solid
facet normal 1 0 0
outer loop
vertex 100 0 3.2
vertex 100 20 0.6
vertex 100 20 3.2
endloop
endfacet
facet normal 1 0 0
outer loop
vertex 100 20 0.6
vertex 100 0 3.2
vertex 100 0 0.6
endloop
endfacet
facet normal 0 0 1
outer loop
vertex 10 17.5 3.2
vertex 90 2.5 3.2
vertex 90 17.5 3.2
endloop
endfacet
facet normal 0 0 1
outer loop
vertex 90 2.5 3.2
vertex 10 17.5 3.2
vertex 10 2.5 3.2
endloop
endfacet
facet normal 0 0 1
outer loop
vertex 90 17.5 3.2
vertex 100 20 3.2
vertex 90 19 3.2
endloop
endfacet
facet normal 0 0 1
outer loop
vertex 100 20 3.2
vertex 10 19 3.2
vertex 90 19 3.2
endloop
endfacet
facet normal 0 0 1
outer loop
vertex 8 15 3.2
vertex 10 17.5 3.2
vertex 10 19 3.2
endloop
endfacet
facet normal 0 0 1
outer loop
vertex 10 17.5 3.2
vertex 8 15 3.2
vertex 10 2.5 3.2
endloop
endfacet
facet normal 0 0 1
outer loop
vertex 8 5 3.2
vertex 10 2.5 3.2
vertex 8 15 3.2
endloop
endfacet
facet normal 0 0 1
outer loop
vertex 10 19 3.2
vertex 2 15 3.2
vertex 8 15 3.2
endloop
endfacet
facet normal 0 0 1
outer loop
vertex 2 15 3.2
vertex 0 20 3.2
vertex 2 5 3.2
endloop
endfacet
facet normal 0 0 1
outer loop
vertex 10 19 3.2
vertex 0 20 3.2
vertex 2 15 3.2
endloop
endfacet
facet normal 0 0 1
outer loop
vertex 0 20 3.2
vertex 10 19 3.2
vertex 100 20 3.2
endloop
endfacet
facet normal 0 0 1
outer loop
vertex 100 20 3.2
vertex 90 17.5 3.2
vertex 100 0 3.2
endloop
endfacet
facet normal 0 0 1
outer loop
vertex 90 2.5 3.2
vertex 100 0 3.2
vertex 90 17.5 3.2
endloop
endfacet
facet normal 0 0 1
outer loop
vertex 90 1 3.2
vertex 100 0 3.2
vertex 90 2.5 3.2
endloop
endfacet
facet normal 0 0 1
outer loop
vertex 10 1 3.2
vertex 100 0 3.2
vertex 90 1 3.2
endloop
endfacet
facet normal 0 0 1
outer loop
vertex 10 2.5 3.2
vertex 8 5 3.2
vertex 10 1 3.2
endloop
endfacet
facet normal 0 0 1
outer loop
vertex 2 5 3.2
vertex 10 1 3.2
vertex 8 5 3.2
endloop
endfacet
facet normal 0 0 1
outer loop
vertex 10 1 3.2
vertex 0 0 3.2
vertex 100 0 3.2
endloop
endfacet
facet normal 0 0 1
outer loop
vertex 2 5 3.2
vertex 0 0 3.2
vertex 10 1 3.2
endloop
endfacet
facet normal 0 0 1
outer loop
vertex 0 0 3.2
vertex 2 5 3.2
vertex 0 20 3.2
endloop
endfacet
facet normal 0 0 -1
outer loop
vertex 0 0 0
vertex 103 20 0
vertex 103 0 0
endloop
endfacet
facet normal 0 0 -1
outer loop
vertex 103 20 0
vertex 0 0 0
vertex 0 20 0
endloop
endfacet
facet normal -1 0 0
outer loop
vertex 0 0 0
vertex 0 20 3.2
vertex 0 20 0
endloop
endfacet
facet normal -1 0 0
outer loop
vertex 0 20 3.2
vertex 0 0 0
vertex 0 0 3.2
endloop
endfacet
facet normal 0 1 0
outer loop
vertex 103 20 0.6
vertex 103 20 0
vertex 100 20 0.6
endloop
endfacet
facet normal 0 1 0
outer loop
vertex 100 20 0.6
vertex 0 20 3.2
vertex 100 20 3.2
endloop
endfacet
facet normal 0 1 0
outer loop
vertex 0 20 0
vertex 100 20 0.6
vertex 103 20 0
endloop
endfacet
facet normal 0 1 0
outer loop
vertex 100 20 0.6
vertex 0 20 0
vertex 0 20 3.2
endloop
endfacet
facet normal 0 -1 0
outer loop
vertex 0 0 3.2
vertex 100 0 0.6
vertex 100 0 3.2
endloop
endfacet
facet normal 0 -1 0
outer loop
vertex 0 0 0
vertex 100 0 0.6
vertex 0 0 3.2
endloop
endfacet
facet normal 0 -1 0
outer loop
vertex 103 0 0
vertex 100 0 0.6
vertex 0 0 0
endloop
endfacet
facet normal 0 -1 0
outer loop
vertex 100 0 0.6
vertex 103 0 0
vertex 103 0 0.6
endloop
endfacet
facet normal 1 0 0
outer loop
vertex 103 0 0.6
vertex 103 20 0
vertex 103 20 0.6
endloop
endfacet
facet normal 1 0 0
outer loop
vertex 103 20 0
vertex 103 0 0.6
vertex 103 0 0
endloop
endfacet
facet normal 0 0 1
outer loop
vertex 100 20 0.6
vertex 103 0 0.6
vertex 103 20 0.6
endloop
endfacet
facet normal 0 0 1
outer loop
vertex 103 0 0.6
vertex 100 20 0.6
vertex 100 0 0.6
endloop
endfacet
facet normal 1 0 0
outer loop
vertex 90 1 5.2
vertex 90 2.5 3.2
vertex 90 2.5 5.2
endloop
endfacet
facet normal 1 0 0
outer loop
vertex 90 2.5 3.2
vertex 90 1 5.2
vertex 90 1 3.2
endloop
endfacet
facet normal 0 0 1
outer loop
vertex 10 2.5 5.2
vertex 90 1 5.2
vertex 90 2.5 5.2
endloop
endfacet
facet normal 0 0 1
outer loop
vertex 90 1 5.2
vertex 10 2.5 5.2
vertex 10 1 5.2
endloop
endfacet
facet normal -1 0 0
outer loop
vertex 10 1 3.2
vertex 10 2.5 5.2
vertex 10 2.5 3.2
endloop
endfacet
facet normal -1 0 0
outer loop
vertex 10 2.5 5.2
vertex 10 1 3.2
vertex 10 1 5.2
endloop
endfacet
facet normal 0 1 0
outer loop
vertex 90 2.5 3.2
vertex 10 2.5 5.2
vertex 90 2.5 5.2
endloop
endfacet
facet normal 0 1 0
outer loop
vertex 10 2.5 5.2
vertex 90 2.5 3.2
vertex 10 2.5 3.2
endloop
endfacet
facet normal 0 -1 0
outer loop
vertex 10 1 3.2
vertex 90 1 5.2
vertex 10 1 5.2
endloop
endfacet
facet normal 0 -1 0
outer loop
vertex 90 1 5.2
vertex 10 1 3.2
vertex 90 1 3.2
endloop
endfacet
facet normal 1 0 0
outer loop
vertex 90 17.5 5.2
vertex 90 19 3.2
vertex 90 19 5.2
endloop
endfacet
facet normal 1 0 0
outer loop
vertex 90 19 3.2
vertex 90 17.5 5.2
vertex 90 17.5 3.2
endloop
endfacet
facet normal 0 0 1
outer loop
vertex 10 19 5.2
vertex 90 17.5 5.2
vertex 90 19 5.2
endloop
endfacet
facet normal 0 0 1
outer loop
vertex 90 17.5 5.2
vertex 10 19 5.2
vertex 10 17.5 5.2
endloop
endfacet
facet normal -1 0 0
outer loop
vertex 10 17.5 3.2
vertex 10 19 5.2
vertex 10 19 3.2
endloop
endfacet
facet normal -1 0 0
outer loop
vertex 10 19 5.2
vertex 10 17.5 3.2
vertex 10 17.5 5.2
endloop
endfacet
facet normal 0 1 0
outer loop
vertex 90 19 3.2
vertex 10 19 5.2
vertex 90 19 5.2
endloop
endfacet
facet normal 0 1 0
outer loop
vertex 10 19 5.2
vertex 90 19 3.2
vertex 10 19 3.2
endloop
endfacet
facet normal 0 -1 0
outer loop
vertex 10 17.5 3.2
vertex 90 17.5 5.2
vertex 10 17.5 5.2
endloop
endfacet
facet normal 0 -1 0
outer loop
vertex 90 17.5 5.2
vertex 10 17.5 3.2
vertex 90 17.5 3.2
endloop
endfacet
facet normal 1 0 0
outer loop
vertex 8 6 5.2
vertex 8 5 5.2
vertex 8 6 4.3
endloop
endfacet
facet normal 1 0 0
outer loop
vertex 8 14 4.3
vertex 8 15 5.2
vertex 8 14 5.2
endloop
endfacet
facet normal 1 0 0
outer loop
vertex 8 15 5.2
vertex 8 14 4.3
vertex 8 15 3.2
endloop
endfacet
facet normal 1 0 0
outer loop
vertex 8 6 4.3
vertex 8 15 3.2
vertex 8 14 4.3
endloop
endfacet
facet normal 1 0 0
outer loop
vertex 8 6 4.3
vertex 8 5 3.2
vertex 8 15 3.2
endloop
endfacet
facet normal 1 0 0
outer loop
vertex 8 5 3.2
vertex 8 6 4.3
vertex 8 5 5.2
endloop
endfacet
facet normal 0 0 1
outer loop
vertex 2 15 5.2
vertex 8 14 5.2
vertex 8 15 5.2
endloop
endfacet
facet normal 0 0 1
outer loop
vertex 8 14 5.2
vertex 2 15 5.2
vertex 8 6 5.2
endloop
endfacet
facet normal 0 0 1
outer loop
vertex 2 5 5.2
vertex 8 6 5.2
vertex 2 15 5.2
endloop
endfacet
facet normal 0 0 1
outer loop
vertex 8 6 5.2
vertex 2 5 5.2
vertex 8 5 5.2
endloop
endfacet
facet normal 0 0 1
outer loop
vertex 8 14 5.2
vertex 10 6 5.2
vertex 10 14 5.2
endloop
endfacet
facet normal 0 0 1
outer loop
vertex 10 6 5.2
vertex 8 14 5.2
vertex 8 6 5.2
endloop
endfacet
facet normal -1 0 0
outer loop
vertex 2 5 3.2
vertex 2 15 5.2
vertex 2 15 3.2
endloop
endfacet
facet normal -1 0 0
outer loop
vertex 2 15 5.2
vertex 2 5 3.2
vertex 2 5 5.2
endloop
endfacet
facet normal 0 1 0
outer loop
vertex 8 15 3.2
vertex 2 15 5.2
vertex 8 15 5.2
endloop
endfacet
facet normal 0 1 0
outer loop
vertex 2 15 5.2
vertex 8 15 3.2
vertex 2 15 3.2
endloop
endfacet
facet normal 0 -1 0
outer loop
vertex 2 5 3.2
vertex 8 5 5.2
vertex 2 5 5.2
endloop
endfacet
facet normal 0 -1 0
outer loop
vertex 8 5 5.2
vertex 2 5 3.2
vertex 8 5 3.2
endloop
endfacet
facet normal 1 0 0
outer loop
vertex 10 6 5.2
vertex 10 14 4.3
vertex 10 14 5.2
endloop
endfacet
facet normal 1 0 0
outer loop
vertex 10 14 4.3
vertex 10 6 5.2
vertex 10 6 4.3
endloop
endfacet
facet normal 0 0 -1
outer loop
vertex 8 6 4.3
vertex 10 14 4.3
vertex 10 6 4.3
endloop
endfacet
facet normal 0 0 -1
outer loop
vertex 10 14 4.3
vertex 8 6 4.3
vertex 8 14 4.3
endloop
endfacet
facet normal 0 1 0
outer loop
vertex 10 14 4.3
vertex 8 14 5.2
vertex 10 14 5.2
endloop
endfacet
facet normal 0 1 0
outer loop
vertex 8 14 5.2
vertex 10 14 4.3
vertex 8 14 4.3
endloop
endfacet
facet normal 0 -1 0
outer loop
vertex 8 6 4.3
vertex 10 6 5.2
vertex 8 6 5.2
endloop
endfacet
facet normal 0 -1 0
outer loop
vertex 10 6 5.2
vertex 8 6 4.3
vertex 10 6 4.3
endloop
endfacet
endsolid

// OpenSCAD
// Bag clip with living hinge - PETG, 0.4mm nozzle, no supports
// Printed open flat (two arms end-to-end), closes by folding 180deg about Y.
// Lower arm at origin, upper arm local origin at its hinge edge.

part = "arm_lower"; // [arm_lower, arm_upper, assembly]
cadverify_only = "";

/* Dimensions (mm) */
Lbody = 100;      // arm body length
Wbody = 20;       // arm width
Tbody = 3.2;      // arm thickness
Hhinge = 6;       // total hinge length (gap between bodies)
Hhalf = 3;        // hinge half length per arm
Thinge = 0.6;     // hinge thickness
Bgap = 2.0;       // bag thickness / closed gap
Ttot = Tbody + Bgap; // 5.2 closed inner top
Zpiv = Tbody + Bgap/2; // 4.2 pivot height
Xpiv = Lbody + Hhalf;  // 103 pivot X in assembly

module instance(name, part, unit = 1) {
    echo(cadverify_instance = [name, part, unit]);
    if (cadverify_only == "" || cadverify_only == name) children();
}

// ---------- lower arm geometry (print orientation, min at 0) ----------
module arm_lower() {
    // body
    cube([Lbody, Wbody, Tbody], false);
    // hinge half (thin, on bed), overlap 0.1 into body
    translate([Lbody-0.1, 0, 0])
        cube([Hhalf+0.1, Wbody, Thinge], false);
    // ribs (2mm tall standoff), overlap 0.1 into body
    translate([10, 1, Tbody-0.1])
        cube([80, 1.5, Bgap+0.1], false);
    translate([10, 17.5, Tbody-0.1])
        cube([80, 1.5, Bgap+0.1], false);
    // latch tower, overlap into body
    translate([2, 5, Tbody-0.1])
        cube([6, 10, Bgap+0.1], false);
    // latch lip (cantilever +X), overlap into tower
    translate([7.9, 6, 4.3])
        cube([2.1, 8, 0.9], false);
}

// ---------- upper arm geometry (print orientation, hinge at x=0) ----------
module arm_upper() {
    // hinge half on bed
    cube([Hhalf+0.1, Wbody, Thinge], false);
    // body, overlap into hinge
    translate([Hhalf-0.1, 0, 0])
        cube([Lbody+0.1, Wbody, Tbody], false);
    // latch tower (maps to closed x=12-18), overlap into body
    translate([85, 5, Tbody-0.1])
        cube([6, 10, Bgap+0.1], false);
    // latch lip (extends +X toward free end), overlap into tower
    translate([91, 6, 4.2])
        cube([2.8, 8, 1.0], false);
    // thumb tab beyond free end, same thickness as body, overlap
    translate([102.9, 6, 0])
        cube([8.1, 8, Tbody], false);
}

// ---------- part / assembly dispatch ----------
if (part == "arm_lower") {
    echo(cadverify_spec = [
        ["bounds", [[0, 0, 0], [103, 20, 5.2]]],
        ["bodies", 1],
        ["through_holes", 0],
        ["support_faces", [["bed", "-z", 1500]]],
        ["overhangs_allowed", [["latch lip", [[7.5, 5.5, 4.0], [10.5, 14.5, 5.5]]]]],
        ["copies", 1],
        ["details", [
            ["arm", "material", [[10, 5, 0.5], [90, 15, 2.7]], 1],
            ["arm_wall", "thickness", [50, 10, 10], [0, 0, -1], 3.2],
            ["hinge", "thickness", [101.5, 10, 5], [0, 0, -1], 0.6],
            ["rib", "material", [[20, 1.2, 3.5], [80, 2.3, 5.0]], 1],
            ["latch_tower", "material", [[3, 6, 3.5], [7, 14, 5.0]], 1],
            ["latch_lip", "material", [[8.5, 7, 4.5], [9.5, 13, 5.0]], 1],
            ["bag_slot", "void", [[20, 3, 3.5], [80, 17, 5.0]], 1]
        ]]
    ]);
    arm_lower();
} else if (part == "arm_upper") {
    echo(cadverify_spec = [
        ["bounds", [[0, 0, 0], [111, 20, 5.2]]],
        ["bodies", 1],
        ["through_holes", 0],
        ["support_faces", [["bed", "-z", 1500]]],
        ["overhangs_allowed", [["latch lip", [[90.5, 5.5, 4.0], [94.5, 14.5, 5.5]]]]],
        ["copies", 1],
        ["details", [
            ["arm", "material", [[10, 5, 0.5], [80, 15, 2.7]], 1],
            ["arm_wall", "thickness", [50, 10, 10], [0, 0, -1], 3.2],
            ["hinge", "thickness", [1.5, 10, 5], [0, 0, -1], 0.6],
            ["latch_tower", "material", [[86, 6, 3.5], [90, 14, 5.0]], 1],
            ["latch_lip", "material", [[91.5, 7, 4.4], [93.5, 13, 5.0]], 1],
            ["thumb_tab", "material", [[104, 7, 0.5], [110, 13, 2.7]], 1],
            ["field", "void", [[10, 3, 3.5], [80, 17, 5.0]], 1]
        ]]
    ]);
    arm_upper();
} else if (part == "assembly") {
    echo(cadverify_spec = [
        ["bounds", [[0, 0, 0], [214, 20, 5.2]]],
        ["support_faces", [["bed", "-z", 3000]]],
        ["motions", [
            ["close", ["upper"], "rotate", [103, 10, 4.2], [0, 1, 0], [0, 180],
                ["flex", [["upper", "lower", 1.0, "latch snap"]]],
                ["stops", [180]]
            ]
        ]],
        ["assembly_order", [
            [["lower"], [0, 0, 0]],
            [["upper"], [0, 0, -1]]
        ]]
    ]);
    instance("lower", "arm_lower") arm_lower();
    instance("upper", "arm_upper") translate([103, 0, 0]) arm_upper();
}
